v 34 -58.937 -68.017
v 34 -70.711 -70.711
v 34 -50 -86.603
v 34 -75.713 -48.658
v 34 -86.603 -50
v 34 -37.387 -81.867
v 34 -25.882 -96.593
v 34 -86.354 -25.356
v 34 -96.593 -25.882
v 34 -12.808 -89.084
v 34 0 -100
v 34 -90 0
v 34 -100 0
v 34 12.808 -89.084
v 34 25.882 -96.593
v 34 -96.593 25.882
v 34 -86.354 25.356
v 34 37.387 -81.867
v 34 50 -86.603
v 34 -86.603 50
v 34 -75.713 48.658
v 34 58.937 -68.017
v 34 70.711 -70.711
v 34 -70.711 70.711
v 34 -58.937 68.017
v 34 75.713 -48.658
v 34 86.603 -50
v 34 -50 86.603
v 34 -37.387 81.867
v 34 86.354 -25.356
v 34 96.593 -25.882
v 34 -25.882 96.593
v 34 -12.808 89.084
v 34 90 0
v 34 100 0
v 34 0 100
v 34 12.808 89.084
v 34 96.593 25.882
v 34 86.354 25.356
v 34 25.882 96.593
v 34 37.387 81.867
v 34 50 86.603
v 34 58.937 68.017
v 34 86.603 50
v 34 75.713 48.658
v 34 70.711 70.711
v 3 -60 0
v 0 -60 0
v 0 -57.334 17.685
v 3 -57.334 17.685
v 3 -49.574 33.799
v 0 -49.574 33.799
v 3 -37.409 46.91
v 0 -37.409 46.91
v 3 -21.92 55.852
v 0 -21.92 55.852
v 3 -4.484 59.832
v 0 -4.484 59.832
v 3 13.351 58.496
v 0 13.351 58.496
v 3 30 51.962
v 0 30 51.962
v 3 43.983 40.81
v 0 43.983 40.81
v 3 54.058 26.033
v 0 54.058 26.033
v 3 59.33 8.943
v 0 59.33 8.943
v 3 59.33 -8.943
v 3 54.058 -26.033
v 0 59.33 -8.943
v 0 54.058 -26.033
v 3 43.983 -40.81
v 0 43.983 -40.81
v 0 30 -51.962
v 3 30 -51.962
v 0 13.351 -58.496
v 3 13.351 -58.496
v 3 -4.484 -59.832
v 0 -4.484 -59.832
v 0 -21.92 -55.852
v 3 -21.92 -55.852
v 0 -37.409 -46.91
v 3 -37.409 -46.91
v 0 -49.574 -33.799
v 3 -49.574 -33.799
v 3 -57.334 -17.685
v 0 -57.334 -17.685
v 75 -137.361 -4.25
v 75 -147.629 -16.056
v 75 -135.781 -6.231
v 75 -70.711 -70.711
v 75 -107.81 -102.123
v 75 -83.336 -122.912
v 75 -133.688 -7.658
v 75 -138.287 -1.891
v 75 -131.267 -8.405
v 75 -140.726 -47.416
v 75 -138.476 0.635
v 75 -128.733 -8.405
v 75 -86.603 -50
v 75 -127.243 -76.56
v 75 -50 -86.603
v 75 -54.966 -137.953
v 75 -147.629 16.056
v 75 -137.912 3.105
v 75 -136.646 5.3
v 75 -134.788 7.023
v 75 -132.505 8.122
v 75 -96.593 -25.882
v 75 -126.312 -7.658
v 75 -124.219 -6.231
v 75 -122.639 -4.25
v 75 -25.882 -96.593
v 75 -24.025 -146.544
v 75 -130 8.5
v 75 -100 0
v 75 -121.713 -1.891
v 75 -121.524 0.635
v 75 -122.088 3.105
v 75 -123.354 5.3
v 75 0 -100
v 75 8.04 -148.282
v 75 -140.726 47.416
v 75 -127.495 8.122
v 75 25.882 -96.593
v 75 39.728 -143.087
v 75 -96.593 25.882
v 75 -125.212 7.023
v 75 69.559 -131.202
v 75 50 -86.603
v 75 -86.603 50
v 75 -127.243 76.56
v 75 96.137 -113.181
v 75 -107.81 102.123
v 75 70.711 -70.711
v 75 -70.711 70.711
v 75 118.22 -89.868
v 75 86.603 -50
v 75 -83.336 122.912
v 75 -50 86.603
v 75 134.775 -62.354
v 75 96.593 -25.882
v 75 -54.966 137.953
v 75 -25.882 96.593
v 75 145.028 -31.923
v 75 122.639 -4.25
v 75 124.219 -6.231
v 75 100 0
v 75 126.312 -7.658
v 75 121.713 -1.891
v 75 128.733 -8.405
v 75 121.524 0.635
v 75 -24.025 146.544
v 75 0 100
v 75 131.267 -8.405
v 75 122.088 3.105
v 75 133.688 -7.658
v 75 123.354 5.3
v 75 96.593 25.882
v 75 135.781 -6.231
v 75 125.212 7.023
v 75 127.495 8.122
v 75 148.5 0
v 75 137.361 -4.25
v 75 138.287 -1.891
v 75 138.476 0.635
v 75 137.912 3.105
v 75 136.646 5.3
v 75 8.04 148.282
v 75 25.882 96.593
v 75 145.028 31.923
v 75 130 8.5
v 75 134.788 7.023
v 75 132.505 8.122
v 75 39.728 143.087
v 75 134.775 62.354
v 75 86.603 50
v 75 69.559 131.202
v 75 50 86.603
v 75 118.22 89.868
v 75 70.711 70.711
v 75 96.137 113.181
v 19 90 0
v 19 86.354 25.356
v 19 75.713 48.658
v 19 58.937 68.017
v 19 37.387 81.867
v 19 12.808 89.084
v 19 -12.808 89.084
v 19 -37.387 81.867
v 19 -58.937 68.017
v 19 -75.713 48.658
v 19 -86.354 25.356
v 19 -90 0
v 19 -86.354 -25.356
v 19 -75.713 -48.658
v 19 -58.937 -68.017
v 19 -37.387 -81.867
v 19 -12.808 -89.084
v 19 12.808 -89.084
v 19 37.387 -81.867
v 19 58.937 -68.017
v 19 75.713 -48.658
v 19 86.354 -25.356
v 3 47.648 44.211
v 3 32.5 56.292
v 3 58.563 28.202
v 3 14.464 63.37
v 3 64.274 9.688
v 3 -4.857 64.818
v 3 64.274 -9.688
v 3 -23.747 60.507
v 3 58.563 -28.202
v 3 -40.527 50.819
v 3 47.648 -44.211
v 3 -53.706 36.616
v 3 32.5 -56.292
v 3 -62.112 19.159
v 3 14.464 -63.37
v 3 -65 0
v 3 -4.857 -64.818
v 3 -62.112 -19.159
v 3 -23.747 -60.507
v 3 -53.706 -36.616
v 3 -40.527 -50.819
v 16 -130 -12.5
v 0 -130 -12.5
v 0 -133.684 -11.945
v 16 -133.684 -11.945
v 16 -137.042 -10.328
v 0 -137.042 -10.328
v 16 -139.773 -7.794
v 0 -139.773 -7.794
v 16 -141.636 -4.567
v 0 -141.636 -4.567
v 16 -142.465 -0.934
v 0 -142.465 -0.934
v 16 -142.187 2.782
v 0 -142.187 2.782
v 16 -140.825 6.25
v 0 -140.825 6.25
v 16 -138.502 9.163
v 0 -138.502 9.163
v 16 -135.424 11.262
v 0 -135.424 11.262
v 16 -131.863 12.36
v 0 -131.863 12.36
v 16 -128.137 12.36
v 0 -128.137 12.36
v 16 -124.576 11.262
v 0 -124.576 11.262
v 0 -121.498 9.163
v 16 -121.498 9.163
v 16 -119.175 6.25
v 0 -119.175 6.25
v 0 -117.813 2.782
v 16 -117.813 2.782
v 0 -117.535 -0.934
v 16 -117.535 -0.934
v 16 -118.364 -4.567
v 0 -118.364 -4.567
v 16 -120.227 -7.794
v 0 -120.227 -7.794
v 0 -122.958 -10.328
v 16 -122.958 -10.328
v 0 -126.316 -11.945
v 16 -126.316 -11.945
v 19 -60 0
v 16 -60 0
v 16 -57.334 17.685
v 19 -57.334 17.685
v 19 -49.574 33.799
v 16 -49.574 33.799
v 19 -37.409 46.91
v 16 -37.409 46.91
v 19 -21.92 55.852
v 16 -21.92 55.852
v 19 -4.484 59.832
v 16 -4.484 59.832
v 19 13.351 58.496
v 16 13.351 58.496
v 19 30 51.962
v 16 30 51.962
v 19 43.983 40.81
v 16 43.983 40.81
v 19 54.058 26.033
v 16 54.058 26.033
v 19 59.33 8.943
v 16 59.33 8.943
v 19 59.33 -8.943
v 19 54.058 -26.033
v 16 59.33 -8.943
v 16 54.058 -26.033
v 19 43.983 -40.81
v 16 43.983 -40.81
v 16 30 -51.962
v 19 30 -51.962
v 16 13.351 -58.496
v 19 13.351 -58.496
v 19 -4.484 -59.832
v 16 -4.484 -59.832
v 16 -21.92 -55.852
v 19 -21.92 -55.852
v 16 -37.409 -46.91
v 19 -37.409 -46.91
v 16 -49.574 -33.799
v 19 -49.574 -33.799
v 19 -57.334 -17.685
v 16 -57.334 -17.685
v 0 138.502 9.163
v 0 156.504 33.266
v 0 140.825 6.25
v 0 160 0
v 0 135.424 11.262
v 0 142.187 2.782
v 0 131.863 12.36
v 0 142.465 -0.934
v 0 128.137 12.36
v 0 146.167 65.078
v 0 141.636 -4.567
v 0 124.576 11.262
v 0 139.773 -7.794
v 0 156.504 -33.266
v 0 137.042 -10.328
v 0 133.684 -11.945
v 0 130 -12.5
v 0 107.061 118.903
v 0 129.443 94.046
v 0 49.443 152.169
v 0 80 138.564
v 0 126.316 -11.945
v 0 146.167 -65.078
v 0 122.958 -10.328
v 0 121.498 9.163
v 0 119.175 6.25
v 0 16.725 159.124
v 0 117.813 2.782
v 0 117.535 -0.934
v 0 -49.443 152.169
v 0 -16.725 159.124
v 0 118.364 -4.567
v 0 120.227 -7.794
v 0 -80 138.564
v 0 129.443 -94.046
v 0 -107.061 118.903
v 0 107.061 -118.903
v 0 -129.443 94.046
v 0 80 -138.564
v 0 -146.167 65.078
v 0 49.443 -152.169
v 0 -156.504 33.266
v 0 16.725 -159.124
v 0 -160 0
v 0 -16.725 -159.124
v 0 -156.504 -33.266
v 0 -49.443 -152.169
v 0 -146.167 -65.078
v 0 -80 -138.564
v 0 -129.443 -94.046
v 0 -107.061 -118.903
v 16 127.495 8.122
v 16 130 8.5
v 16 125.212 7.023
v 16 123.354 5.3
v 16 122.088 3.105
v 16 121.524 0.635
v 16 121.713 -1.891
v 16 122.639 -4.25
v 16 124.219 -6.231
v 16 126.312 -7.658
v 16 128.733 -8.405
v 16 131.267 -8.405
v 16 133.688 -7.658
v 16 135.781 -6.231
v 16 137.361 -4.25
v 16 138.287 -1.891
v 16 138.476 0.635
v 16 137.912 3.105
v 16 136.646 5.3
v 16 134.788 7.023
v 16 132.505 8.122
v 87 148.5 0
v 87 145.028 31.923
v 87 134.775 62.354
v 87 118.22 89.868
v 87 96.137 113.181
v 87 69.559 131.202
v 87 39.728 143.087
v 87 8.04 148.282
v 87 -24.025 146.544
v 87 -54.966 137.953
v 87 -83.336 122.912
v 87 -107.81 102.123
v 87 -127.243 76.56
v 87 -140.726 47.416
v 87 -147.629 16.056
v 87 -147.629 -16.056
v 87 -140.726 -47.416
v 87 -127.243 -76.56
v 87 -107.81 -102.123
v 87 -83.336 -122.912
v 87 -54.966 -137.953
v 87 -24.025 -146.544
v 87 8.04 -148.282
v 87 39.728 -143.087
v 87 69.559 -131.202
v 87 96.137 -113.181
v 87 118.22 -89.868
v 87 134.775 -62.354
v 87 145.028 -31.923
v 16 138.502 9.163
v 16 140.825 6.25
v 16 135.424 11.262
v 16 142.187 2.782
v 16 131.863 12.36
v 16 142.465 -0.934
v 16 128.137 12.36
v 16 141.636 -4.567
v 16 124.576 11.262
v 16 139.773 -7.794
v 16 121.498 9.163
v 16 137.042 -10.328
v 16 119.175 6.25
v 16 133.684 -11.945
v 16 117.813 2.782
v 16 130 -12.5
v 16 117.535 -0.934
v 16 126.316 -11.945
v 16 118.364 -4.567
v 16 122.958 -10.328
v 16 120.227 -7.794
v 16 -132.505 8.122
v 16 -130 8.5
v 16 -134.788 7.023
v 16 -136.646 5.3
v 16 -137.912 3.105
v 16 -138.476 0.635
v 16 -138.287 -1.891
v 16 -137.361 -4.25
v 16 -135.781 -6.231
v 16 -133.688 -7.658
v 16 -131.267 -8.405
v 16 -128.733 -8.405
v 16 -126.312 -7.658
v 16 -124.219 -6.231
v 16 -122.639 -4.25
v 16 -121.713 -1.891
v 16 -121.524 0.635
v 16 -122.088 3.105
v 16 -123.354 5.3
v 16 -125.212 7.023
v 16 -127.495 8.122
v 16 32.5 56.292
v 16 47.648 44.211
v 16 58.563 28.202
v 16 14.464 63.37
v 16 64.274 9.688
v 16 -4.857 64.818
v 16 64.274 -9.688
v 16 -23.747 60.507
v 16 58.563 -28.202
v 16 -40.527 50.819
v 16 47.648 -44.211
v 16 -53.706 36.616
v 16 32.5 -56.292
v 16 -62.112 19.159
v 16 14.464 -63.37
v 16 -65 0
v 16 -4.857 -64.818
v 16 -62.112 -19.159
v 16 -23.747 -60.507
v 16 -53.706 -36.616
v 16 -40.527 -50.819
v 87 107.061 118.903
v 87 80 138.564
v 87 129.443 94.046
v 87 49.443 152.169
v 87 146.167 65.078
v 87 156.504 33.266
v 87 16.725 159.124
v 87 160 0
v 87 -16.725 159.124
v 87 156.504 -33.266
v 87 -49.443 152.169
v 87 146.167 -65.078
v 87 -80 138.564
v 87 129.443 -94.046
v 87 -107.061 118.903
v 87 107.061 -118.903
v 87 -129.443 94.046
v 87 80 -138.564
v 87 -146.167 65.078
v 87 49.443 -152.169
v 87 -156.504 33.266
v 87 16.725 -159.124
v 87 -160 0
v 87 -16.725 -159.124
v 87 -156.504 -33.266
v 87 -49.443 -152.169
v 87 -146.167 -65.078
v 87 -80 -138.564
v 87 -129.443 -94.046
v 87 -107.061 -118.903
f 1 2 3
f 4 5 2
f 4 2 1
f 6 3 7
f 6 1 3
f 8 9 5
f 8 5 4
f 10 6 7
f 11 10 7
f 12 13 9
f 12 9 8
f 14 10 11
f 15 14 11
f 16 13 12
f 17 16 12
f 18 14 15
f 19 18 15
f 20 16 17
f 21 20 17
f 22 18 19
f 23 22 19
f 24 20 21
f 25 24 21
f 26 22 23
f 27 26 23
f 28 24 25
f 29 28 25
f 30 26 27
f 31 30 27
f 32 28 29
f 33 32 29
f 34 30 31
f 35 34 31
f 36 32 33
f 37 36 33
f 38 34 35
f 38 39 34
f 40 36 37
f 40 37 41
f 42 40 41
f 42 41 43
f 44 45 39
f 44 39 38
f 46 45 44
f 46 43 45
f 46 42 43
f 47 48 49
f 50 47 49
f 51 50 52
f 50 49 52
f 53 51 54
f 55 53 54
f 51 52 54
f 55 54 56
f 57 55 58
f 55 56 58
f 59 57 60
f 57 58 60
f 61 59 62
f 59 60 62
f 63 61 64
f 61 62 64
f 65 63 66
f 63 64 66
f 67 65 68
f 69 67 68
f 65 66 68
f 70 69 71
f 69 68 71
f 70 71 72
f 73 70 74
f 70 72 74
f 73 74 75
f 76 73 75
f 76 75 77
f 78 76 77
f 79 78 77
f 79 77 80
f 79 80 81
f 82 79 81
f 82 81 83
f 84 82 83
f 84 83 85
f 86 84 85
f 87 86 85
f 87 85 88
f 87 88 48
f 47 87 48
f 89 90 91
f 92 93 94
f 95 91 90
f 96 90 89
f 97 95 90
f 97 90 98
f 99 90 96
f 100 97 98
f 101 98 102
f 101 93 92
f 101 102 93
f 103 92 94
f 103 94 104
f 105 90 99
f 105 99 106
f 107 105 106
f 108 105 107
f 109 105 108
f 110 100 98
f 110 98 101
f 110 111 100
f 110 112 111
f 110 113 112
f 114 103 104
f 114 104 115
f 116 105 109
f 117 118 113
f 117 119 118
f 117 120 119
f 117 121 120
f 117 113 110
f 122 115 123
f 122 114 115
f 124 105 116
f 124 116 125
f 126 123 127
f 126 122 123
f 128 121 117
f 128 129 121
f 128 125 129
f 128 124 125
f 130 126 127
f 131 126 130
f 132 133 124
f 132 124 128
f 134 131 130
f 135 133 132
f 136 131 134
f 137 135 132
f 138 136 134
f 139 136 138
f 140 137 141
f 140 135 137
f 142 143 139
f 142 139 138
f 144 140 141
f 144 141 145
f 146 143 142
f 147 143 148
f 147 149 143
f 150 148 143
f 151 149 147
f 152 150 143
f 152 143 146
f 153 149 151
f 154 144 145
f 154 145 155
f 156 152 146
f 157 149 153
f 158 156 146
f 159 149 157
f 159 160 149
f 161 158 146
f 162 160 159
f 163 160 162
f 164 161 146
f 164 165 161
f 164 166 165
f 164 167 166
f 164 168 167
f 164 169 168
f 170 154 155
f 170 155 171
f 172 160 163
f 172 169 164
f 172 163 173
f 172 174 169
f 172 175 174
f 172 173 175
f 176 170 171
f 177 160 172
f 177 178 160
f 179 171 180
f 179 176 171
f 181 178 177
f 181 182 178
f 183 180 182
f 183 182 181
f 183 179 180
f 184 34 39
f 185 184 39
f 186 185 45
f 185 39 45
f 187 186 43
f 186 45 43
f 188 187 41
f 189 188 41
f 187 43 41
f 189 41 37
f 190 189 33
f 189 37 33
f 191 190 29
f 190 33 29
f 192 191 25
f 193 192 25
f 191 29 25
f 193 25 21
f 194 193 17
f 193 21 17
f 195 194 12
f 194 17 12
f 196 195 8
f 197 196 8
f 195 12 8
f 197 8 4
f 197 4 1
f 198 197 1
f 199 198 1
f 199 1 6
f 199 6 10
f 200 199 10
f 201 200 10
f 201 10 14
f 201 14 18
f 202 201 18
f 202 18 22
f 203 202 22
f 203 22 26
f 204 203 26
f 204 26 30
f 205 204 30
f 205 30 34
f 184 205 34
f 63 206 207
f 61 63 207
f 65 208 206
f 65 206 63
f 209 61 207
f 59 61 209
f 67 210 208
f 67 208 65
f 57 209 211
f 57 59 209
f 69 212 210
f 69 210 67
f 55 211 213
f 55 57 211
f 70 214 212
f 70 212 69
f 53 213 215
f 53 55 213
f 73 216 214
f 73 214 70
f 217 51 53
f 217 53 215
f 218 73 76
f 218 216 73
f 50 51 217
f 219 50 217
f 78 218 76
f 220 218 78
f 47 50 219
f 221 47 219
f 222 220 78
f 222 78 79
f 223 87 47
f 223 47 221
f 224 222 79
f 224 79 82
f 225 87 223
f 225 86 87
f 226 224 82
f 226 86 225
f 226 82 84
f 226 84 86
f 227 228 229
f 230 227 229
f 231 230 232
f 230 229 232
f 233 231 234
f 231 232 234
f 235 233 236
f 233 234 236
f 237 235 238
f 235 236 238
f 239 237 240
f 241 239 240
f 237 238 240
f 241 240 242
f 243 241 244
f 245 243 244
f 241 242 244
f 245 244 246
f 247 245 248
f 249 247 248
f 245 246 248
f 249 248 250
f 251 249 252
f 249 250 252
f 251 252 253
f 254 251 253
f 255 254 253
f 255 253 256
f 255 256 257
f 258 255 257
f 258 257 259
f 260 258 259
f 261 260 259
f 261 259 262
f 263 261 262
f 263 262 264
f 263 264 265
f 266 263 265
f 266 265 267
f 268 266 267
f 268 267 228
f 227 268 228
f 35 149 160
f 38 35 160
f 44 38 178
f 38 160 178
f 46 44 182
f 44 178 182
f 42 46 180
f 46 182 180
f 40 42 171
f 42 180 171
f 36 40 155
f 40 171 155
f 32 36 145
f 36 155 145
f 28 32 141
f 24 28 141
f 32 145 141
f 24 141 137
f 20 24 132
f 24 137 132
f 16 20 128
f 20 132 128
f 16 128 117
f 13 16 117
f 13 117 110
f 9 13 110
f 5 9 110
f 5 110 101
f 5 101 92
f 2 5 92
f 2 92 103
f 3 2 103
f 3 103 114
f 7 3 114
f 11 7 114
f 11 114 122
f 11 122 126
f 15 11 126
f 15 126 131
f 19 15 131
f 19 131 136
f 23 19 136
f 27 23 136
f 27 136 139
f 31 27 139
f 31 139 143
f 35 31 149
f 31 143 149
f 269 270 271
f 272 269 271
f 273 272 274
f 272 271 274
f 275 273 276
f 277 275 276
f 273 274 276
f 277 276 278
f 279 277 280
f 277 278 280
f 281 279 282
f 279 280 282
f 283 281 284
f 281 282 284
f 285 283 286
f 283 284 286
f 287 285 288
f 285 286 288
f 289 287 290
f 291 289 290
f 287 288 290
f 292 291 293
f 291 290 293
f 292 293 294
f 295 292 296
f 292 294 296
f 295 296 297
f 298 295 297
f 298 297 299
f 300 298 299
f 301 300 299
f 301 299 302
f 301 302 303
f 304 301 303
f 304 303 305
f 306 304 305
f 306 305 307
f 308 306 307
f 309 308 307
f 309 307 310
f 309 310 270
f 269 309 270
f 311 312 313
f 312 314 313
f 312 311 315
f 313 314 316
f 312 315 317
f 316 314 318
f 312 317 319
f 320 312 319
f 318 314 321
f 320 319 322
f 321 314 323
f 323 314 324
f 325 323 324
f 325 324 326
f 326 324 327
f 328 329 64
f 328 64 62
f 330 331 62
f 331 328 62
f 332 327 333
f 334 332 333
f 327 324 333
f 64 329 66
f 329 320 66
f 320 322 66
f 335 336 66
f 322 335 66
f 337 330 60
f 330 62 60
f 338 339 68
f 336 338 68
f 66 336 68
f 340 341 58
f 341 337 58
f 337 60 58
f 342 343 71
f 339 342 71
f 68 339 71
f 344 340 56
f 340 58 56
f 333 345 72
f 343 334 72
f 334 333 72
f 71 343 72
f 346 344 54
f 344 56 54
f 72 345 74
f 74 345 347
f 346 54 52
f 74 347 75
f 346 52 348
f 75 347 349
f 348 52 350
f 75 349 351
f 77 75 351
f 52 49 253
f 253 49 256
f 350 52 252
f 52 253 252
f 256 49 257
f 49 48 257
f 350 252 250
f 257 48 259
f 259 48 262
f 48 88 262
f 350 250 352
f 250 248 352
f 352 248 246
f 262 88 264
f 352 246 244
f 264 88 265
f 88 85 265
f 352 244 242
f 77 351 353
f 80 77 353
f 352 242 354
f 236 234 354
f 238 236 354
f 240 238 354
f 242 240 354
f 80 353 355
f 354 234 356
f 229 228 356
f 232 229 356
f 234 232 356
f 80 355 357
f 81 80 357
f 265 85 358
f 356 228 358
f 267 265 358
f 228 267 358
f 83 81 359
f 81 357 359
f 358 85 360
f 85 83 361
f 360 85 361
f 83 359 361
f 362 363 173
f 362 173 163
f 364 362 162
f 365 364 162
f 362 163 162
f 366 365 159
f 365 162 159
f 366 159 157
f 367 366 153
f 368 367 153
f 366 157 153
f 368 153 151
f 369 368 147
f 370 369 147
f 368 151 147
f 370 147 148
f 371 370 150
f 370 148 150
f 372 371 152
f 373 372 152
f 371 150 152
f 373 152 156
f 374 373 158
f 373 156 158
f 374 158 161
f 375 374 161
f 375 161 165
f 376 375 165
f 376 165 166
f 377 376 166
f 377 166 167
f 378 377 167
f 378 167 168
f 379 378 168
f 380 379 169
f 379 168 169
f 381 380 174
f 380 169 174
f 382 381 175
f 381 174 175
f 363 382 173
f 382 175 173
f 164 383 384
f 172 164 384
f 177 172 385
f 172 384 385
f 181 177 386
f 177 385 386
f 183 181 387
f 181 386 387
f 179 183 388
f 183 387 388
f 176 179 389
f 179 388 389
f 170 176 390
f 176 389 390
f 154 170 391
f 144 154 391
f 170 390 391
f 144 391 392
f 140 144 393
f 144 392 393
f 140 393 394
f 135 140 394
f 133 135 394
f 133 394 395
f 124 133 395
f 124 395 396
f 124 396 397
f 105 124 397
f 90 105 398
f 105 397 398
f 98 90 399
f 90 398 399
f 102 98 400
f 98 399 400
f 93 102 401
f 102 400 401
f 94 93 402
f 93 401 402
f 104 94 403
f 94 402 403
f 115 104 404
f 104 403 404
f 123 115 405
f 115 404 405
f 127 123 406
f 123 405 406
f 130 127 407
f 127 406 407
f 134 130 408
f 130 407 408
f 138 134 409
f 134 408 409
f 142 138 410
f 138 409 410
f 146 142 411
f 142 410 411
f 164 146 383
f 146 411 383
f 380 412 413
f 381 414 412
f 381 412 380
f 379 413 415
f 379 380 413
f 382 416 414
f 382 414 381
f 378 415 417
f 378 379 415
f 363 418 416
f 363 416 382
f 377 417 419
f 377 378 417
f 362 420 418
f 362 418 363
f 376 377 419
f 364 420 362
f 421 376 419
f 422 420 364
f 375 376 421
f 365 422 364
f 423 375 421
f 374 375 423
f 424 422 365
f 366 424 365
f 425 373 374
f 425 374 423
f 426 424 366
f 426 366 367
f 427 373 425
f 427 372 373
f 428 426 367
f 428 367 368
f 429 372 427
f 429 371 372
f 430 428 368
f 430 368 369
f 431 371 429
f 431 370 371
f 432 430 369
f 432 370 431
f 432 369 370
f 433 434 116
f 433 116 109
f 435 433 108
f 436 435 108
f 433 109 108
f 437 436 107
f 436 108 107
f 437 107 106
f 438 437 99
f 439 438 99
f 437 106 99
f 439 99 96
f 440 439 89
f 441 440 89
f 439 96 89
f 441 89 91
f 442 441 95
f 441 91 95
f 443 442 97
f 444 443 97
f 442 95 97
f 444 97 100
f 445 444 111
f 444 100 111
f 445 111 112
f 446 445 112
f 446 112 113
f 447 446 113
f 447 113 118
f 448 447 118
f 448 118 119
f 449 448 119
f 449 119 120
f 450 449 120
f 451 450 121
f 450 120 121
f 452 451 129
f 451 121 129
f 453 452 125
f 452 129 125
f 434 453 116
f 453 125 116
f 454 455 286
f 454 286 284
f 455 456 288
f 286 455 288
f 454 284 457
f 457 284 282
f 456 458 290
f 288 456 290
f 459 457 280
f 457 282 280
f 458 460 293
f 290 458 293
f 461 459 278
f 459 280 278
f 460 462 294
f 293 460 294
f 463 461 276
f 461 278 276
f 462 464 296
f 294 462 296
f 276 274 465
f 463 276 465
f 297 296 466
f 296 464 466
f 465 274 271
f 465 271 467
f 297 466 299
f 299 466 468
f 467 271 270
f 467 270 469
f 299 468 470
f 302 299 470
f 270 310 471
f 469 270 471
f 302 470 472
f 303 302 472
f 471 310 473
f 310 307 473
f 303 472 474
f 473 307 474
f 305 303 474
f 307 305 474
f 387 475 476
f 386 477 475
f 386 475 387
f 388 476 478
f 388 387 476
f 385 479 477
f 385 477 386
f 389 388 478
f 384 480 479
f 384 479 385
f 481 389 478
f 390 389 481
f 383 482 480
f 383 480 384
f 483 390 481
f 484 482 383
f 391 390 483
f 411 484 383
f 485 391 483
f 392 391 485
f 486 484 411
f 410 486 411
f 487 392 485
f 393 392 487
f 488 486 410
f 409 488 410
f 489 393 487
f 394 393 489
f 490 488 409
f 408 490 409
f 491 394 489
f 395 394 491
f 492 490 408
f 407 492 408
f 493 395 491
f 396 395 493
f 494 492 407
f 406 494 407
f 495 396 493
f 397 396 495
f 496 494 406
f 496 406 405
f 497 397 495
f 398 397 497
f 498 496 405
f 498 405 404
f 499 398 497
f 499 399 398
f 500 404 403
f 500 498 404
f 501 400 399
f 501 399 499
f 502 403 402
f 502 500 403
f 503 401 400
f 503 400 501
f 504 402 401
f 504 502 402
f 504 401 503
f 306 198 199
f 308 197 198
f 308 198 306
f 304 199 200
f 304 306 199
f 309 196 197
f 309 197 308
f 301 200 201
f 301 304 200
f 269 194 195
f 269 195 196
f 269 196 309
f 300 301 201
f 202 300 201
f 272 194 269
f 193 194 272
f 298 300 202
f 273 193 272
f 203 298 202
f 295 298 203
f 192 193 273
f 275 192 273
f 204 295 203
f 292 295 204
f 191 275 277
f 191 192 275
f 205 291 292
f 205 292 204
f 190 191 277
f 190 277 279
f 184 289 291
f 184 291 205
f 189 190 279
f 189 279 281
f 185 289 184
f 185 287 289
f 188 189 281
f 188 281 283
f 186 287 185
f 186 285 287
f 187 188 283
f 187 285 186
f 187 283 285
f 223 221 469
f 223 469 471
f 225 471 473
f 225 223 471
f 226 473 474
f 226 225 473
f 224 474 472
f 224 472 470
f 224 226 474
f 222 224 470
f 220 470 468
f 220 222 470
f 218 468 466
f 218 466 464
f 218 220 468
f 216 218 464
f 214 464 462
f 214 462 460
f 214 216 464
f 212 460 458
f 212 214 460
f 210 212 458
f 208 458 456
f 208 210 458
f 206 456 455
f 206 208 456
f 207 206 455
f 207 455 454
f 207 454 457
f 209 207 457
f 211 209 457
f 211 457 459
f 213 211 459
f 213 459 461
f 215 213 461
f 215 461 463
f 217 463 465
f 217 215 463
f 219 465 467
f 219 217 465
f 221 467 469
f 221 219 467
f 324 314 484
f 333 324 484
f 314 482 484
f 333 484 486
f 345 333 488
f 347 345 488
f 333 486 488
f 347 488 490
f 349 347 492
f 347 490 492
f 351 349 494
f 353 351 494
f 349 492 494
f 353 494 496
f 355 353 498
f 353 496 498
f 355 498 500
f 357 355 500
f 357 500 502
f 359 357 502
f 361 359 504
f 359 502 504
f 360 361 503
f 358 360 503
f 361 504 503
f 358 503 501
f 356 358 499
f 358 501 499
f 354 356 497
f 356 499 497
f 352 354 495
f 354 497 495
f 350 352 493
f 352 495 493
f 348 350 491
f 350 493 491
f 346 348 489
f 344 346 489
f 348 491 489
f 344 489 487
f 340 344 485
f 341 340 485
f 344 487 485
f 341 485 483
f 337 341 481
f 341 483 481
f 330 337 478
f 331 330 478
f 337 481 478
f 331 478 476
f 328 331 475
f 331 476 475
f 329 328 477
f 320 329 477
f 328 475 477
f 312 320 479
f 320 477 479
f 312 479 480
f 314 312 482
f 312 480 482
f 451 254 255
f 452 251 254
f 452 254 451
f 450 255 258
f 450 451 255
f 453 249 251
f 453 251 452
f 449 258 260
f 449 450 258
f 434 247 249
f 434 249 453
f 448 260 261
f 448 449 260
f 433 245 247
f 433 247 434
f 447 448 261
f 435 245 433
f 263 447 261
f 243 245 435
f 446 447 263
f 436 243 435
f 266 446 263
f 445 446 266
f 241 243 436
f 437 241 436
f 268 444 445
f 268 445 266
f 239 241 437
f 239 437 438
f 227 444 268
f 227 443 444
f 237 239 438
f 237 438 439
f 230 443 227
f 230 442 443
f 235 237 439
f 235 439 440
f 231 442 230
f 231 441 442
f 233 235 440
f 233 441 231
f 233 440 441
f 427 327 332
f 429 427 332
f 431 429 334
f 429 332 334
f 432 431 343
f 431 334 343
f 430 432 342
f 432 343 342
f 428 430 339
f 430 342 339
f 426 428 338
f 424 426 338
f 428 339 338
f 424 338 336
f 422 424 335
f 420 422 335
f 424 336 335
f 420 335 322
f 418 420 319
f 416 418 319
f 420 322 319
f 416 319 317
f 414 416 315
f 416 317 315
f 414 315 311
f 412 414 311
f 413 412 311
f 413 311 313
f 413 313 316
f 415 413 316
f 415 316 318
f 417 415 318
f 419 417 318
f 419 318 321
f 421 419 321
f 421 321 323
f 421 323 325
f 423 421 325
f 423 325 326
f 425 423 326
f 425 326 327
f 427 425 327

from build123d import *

# Parameters (mm, degrees)
ESQUISSE1_W             = 87
ESQUISSE1_H             = 160
ESQUISSE2_R             = 148.5
ENL_V_MAT_EXTRU_1_DEPTH = 12
ESQUISSE2_3_R           = 100
ESQUISSE2_3_R_2         = 90
ENL_V_MAT_EXTRU_2_DEPTH = 53
ESQUISSE4_R             = 90
ENL_V_MAT_EXTRU_3_DEPTH = 56
ESQUISSE10_R            = 60
ENL_V_MAT_EXTRU_4_DEPTH = 56
ENL_V_START             = 3
ESQUISSE11_R            = 65
ENL_V_MAT_EXTRU_7_DEPTH = 13
PER_AGE2_D              = 17
PER_AGE2_DEPTH          = 83
PER_AGE2_CBORE_D        = 25
PER_AGE2_CBORE_DEPTH    = 16


with BuildPart() as part:
    # Esquisse1 → Révolution1 (revolve)
    with BuildSketch(Plane.XY):
        with Locations((43.5, 80)):
            Rectangle(ESQUISSE1_W, ESQUISSE1_H)
    revolve(axis=Axis((87, 0, 0), (-1, 0, 0)))

    # Esquisse2 → Enlèv. mat.-Extru.1 (cut)
    with BuildSketch(Plane(origin=(87, 0, 0), x_dir=(0, 0, -1), z_dir=(1, 0, 0))):
        Circle(ESQUISSE2_R)
    extrude(amount=-ENL_V_MAT_EXTRU_1_DEPTH, mode=Mode.SUBTRACT)

    # Esquisse2<3> → Enlèv. mat.-Extru.2 (cut)
    with BuildSketch(Plane(origin=(87, 0, 0), x_dir=(0, 0, -1), z_dir=(1, 0, 0))):
        Circle(ESQUISSE2_3_R)
        Circle(ESQUISSE2_3_R_2, mode=Mode.SUBTRACT)
    extrude(amount=-ENL_V_MAT_EXTRU_2_DEPTH, mode=Mode.SUBTRACT)

    # Esquisse4 → Enlèv. mat.-Extru.3 (cut)
    with BuildSketch(Plane(origin=(75, 0, 0), x_dir=(0, 0, -1), z_dir=(1, 0, 0))):
        Circle(ESQUISSE4_R)
    extrude(amount=-ENL_V_MAT_EXTRU_3_DEPTH, mode=Mode.SUBTRACT)

    # Esquisse10 → Enlèv. mat.-Extru.4 (cut)
    with BuildSketch(Plane.ZY):
        Circle(ESQUISSE10_R)
    extrude(amount=-ENL_V_MAT_EXTRU_4_DEPTH, mode=Mode.SUBTRACT)

    # Esquisse11 → Enlèv. mat.-Extru.7 (cut)
    with BuildSketch(Plane(origin=(0, 0, 0), x_dir=(0, 0, -1), z_dir=(1, 0, 0)).offset(ENL_V_START)):
        Circle(ESQUISSE11_R)
    extrude(amount=ENL_V_MAT_EXTRU_7_DEPTH, mode=Mode.SUBTRACT)

    # Perçage2
    with Locations(Plane(origin=(0, 130, 0), x_dir=(0, 0, -1), z_dir=(-1, 0, 0))):
        with Locations((0, 0), (0, 260)):
            CounterBoreHole(PER_AGE2_D / 2, PER_AGE2_CBORE_D / 2, PER_AGE2_CBORE_DEPTH, depth=PER_AGE2_DEPTH)


solid = part.part
